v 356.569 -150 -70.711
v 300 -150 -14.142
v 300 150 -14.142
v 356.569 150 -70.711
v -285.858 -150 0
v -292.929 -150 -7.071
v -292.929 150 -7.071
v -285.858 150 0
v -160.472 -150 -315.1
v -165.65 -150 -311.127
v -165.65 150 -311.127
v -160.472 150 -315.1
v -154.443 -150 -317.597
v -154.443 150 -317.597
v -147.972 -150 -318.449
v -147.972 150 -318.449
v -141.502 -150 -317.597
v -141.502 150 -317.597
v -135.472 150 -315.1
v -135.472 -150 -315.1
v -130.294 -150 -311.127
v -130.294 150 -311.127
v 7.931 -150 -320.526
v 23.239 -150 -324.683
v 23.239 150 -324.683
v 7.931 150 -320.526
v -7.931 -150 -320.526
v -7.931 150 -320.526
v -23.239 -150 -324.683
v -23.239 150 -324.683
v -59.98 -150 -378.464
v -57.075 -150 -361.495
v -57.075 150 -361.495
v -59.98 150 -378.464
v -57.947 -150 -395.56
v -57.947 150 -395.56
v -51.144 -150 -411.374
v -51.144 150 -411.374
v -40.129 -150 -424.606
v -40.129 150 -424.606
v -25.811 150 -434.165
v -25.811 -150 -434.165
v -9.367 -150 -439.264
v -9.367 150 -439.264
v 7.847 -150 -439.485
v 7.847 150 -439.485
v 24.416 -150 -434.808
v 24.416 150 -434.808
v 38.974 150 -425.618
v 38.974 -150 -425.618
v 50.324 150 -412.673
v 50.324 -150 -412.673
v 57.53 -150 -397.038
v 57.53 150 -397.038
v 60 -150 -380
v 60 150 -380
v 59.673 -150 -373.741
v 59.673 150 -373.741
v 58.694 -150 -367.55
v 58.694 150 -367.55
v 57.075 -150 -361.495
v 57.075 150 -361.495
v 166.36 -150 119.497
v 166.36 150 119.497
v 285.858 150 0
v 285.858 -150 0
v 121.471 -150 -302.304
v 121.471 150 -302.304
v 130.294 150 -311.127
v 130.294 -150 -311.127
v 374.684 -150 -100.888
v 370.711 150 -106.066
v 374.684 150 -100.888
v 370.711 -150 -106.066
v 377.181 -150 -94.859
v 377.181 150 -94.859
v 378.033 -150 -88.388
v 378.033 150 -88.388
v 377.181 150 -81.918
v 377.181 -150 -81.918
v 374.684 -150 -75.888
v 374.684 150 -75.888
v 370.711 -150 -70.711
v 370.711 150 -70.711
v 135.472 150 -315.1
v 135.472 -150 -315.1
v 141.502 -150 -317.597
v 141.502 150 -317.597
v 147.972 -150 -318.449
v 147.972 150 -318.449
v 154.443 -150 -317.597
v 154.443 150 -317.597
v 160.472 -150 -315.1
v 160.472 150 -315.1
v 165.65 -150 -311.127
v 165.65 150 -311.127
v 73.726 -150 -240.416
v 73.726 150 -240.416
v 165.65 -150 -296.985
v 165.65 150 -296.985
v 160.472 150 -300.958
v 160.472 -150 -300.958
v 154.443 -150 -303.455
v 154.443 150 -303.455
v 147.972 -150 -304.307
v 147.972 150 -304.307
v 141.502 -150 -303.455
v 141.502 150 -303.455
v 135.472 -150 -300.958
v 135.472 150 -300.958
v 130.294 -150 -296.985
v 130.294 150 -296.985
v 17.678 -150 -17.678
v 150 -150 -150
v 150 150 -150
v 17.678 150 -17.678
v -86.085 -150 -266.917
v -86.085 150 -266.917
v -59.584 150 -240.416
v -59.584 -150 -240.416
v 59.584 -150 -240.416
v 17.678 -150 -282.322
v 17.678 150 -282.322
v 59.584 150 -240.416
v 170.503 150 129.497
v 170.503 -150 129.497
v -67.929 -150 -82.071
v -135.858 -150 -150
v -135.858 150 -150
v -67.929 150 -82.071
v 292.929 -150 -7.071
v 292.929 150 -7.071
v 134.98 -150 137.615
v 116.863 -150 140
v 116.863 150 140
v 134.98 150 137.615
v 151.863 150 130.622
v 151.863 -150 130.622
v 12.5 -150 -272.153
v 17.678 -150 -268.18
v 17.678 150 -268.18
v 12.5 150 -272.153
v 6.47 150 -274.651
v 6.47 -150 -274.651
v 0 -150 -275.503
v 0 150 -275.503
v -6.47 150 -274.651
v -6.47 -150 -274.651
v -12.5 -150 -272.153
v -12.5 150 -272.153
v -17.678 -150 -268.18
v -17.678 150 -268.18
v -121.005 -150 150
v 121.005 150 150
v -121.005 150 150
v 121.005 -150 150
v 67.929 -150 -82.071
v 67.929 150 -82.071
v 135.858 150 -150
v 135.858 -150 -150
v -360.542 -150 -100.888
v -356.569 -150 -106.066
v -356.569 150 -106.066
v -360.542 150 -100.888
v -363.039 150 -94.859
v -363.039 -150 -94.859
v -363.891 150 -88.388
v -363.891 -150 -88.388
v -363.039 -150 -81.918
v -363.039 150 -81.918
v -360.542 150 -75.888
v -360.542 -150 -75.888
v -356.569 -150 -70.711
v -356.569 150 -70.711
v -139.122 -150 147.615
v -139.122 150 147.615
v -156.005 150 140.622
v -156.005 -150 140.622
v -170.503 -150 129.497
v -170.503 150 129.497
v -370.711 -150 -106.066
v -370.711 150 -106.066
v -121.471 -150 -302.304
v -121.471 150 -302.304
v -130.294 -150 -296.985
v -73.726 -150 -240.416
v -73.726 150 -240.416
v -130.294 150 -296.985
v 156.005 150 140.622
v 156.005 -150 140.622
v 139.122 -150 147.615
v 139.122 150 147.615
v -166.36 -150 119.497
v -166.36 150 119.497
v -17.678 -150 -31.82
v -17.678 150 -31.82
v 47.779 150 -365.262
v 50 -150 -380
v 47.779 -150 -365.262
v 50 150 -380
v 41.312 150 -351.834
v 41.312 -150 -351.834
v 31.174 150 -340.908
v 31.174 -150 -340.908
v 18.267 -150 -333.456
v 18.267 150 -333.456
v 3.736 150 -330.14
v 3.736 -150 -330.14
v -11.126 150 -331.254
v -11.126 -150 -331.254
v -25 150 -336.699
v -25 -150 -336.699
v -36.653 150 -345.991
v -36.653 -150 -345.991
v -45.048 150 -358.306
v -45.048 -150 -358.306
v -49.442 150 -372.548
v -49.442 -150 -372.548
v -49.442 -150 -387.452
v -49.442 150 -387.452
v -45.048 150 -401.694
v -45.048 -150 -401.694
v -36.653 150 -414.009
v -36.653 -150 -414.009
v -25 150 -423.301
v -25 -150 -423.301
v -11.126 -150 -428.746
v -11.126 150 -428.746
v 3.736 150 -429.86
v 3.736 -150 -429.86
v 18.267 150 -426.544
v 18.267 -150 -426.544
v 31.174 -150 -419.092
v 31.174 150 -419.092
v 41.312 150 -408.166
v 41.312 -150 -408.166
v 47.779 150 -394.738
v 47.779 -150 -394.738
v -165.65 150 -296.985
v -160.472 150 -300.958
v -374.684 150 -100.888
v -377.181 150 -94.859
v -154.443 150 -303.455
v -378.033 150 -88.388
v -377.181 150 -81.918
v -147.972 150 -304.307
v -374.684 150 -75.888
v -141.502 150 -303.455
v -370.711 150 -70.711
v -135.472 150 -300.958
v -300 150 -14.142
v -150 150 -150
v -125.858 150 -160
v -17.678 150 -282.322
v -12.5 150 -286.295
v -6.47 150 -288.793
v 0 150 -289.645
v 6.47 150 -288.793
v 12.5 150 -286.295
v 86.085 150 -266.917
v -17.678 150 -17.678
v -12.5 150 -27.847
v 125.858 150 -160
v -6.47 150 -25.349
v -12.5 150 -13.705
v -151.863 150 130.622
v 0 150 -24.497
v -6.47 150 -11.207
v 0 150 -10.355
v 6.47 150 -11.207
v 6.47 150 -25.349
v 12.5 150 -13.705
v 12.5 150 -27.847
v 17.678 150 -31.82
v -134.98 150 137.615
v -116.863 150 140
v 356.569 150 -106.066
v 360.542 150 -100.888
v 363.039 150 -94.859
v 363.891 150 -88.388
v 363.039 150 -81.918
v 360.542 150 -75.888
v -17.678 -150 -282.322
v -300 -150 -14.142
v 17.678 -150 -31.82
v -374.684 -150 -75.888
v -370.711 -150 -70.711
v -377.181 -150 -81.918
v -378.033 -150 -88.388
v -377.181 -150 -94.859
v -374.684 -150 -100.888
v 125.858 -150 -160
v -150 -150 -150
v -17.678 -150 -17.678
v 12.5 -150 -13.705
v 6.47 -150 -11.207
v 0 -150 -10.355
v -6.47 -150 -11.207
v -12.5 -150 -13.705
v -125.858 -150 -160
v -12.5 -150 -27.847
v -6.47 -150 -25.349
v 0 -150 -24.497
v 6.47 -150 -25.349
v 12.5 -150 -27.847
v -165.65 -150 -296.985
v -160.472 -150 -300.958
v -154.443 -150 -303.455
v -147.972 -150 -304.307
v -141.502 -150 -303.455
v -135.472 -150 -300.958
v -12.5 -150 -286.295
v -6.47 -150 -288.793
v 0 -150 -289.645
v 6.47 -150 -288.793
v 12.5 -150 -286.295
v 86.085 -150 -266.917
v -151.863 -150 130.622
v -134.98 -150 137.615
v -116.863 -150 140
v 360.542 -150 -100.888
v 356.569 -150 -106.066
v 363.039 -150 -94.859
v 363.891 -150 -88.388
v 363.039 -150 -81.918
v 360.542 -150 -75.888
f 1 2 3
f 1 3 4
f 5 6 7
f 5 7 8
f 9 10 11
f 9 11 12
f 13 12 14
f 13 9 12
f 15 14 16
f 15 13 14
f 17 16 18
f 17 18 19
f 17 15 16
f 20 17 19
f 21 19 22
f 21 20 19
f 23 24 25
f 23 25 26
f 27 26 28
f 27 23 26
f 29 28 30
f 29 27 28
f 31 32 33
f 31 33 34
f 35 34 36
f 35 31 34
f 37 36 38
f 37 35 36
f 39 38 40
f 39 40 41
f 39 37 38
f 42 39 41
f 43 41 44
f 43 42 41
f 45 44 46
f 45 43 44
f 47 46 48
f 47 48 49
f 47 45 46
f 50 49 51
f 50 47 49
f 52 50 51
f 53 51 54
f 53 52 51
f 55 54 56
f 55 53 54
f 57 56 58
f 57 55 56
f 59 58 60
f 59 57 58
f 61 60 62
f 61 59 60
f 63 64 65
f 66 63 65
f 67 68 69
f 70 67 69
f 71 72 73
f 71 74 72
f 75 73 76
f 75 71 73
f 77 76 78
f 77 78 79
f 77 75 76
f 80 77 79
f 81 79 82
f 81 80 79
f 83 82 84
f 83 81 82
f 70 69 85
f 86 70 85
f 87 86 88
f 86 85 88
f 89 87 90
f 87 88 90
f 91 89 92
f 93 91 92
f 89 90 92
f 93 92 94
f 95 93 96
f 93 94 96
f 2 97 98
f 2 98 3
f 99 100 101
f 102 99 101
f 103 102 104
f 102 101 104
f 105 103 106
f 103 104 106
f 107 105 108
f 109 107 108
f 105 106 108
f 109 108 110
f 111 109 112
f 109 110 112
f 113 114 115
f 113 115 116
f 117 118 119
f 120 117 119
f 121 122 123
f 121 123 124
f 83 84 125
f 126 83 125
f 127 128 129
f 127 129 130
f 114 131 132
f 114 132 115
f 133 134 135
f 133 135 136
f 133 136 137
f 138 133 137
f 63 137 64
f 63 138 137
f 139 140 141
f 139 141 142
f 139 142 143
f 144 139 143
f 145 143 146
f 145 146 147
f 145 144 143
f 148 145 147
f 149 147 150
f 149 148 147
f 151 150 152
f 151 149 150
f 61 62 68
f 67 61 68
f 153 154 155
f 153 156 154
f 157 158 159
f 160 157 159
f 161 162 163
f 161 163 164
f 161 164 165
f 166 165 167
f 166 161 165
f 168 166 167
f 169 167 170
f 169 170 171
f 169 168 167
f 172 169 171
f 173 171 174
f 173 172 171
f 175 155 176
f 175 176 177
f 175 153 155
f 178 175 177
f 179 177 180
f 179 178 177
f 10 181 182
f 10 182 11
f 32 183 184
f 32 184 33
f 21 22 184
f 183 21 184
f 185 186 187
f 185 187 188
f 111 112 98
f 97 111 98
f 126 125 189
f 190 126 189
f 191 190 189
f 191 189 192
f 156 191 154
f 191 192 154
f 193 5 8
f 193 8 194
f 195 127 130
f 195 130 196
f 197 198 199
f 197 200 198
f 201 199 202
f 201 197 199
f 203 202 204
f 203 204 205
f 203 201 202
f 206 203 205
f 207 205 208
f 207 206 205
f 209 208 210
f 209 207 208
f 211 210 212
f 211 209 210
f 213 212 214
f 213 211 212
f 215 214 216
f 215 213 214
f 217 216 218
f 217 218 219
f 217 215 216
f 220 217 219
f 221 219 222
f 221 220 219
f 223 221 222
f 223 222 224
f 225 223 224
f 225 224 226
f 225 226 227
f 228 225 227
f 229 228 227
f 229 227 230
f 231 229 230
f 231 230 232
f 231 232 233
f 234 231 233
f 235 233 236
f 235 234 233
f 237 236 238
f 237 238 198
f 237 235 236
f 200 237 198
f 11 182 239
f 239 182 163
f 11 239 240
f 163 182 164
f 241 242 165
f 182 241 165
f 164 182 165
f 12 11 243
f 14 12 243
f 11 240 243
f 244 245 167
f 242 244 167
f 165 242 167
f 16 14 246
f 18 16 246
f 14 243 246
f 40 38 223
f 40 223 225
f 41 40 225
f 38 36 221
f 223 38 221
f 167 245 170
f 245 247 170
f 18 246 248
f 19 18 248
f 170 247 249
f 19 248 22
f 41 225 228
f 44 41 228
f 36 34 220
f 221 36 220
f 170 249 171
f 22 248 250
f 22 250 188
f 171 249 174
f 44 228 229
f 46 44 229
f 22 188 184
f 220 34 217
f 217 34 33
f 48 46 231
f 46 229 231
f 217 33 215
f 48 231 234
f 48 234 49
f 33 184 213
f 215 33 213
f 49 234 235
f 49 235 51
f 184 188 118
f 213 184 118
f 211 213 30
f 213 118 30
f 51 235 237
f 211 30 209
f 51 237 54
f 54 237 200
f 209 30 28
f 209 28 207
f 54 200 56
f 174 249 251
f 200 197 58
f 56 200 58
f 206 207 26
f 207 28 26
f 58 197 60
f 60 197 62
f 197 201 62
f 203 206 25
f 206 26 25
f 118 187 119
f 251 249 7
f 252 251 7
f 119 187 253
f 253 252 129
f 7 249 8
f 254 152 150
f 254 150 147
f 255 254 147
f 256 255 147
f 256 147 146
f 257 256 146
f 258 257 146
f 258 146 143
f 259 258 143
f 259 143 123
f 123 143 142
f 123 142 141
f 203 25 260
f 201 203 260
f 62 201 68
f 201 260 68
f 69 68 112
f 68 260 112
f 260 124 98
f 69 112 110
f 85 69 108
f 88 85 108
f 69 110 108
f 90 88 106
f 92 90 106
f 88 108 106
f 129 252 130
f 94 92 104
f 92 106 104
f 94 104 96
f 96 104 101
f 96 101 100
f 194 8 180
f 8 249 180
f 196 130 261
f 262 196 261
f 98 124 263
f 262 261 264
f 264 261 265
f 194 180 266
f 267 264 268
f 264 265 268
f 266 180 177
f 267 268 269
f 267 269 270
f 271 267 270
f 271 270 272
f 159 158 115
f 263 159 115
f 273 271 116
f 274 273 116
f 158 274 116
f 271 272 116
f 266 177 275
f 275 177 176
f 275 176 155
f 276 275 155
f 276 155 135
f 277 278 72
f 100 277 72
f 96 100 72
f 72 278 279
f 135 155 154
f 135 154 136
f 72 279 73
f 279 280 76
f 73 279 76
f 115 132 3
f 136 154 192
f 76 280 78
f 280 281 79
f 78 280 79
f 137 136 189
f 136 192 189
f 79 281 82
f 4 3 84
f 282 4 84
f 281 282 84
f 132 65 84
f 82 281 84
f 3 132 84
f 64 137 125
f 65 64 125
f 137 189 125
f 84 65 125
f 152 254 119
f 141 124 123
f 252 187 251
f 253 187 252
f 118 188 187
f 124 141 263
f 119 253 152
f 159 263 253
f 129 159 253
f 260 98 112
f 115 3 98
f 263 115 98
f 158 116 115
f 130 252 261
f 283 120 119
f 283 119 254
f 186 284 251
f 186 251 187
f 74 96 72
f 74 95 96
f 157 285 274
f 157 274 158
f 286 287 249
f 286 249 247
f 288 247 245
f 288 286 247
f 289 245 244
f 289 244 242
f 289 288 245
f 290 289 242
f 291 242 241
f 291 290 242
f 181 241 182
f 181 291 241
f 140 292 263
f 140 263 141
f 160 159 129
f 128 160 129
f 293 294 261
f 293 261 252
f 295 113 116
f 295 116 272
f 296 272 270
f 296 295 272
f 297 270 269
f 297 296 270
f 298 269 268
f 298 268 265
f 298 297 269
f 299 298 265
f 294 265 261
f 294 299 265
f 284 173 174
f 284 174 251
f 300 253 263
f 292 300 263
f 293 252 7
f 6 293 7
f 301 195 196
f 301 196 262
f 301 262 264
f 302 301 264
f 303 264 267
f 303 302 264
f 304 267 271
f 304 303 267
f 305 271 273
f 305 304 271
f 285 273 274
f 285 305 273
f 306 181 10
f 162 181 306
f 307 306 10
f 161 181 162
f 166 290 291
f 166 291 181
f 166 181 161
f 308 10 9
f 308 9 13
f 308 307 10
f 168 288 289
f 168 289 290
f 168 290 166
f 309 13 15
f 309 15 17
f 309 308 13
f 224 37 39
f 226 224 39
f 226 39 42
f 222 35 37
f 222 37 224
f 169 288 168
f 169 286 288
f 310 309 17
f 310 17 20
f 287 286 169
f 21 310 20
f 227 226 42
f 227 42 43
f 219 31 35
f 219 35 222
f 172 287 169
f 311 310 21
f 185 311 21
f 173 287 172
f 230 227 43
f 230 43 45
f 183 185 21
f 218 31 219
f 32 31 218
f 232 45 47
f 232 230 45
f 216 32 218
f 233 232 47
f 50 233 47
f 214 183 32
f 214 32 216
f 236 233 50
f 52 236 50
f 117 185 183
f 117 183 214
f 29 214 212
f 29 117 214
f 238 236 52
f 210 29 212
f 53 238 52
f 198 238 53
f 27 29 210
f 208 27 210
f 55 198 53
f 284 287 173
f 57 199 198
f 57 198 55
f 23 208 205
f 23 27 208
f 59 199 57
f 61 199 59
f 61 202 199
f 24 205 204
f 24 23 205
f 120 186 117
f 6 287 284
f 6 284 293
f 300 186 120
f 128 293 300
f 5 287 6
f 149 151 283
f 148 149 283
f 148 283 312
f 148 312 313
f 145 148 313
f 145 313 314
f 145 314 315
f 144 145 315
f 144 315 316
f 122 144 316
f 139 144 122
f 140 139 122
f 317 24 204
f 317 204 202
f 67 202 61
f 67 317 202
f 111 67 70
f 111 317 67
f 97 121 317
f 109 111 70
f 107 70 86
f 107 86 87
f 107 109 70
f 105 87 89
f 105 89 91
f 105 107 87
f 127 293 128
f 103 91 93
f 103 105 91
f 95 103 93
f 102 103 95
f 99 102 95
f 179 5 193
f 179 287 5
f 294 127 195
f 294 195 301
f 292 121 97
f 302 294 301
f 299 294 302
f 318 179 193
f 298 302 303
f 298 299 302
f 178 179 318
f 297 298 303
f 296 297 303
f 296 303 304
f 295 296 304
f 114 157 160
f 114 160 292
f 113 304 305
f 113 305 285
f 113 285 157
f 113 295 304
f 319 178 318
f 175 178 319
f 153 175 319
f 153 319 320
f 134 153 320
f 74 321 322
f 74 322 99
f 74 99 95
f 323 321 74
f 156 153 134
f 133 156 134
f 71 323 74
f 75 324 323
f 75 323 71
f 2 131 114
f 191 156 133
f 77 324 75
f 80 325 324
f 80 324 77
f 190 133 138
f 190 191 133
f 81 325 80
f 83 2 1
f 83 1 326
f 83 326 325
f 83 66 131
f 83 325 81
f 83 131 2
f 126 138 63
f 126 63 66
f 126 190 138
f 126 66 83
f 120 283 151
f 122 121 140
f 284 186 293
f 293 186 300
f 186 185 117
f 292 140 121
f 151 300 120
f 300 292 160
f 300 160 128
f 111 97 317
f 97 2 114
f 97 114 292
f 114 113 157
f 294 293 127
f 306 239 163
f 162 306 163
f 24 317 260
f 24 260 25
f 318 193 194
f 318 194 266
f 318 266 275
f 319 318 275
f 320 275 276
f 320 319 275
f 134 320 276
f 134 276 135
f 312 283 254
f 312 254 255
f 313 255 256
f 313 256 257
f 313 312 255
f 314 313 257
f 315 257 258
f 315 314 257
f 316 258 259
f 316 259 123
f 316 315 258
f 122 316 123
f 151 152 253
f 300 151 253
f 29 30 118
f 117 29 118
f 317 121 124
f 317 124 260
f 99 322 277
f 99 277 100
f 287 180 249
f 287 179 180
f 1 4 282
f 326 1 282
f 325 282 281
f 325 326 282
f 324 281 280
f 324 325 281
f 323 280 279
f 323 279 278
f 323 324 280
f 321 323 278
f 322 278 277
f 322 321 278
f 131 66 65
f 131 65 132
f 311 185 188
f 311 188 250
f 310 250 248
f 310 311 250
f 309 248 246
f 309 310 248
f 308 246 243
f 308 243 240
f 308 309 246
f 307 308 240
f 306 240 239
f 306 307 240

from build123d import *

# Parameters (mm, degrees)
F0_R     = 50
F1_DEPTH = 150


# Not quite as in the source:
# - a feature names something its author has since deleted; it is built from what else it names


with BuildPart() as f1:
    # F0 (on Front) → F1 (new body, symmetric)
    with BuildSketch(Plane.XZ):
        with BuildLine():
            Line((-170.5025253169, 129.4974746831), (-300, 0))
            Line((-300, 0), (-292.9289321881, -7.0710678119))
            Line((-292.9289321881, -7.0710678119), (-285.8578643763, 0))
            Line((-285.8578643763, 0), (-166.3603896932, 119.4974746831))
            ThreePointArc((-166.3603896932, 119.4974746831), (-143.6507552757, 134.6715672758), (-116.8629150102, 140))
            Line((-116.8629150102, 140), (116.8629150102, 140))
            ThreePointArc((116.8629150102, 140), (143.6507552757, 134.6715672758), (166.3603896932, 119.4974746831))
            Line((166.3603896932, 119.4974746831), (285.8578643763, 0))
            Line((285.8578643763, 0), (292.9289321881, -7.0710678119))
            Line((292.9289321881, -7.0710678119), (150, -150))
            Line((150, -150), (59.5836943966, -240.4163056034))
            Line((59.5836943966, -240.4163056034), (86.0845268471, -266.917138054))
            Line((86.0845268471, -266.917138054), (121.4712095943, -302.3038208012))
            Line((121.4712095943, -302.3038208012), (130.2943725152, -311.1269837221))
            ThreePointArc((130.2943725152, -311.1269837221), (147.9720420449, -318.4493141924), (165.6497115746, -311.1269837221))
            Line((165.6497115746, -311.1269837221), (370.7106781187, -106.066017178))
            ThreePointArc((370.7106781187, -106.066017178), (378.033008589, -88.3883476483), (370.7106781187, -70.7106781187))
            Line((370.7106781187, -70.7106781187), (300, 0))
            Line((300, 0), (170.5025253169, 129.4974746831))
            ThreePointArc((170.5025253169, 129.4974746831), (147.7928908994, 144.6715672758), (121.0050506339, 150))
            Line((121.0050506339, 150), (-121.0050506339, 150))
            ThreePointArc((-121.0050506339, 150), (-147.7928908994, 144.6715672758), (-170.5025253169, 129.4974746831))
        make_face()
        with BuildLine():
            Line((73.7258300203, -240.4163056034), (300, -14.1421356237))
            Line((300, -14.1421356237), (356.5685424949, -70.7106781187))
            ThreePointArc((356.5685424949, -70.7106781187), (363.8908729653, -88.3883476483), (356.5685424949, -106.066017178))
            Line((356.5685424949, -106.066017178), (165.6497115746, -296.9848480984))
            ThreePointArc((165.6497115746, -296.9848480984), (147.9720420449, -304.3071785687), (130.2943725152, -296.9848480984))
            Line((130.2943725152, -296.9848480984), (73.7258300203, -240.4163056034))
        make_face(mode=Mode.SUBTRACT)
        with BuildLine():
            Line((-17.6776695297, -17.6776695297), (-150, -150))
            Line((-150, -150), (-59.5836943966, -240.4163056034))
            Line((-59.5836943966, -240.4163056034), (-17.6776695297, -282.3223304703))
            ThreePointArc((-17.6776695297, -282.3223304703), (0, -289.6446609407), (17.6776695297, -282.3223304703))
            Line((17.6776695297, -282.3223304703), (59.5836943966, -240.4163056034))
            Line((59.5836943966, -240.4163056034), (150, -150))
            Line((150, -150), (17.6776695297, -17.6776695297))
            ThreePointArc((17.6776695297, -17.6776695297), (0, -10.3553390593), (-17.6776695297, -17.6776695297))
        make_face()
        with BuildLine():
            ThreePointArc((17.6776695297, -268.1801948466), (0, -275.5025253169), (-17.6776695297, -268.1801948466))
            Line((-17.6776695297, -268.1801948466), (-125.8578643763, -160))
            Line((-125.8578643763, -160), (-135.8578643763, -150))
            Line((-135.8578643763, -150), (-67.9289321881, -82.0710678119))
            Line((-67.9289321881, -82.0710678119), (-17.6776695297, -31.8198051534))
            ThreePointArc((-17.6776695297, -31.8198051534), (0, -24.4974746831), (17.6776695297, -31.8198051534))
            Line((17.6776695297, -31.8198051534), (67.9289321881, -82.0710678119))
            Line((67.9289321881, -82.0710678119), (135.8578643763, -150))
            Line((135.8578643763, -150), (125.8578643763, -160))
            Line((125.8578643763, -160), (17.6776695297, -268.1801948466))
        make_face(mode=Mode.SUBTRACT)
        with BuildLine():
            Line((-292.9289321881, -7.0710678119), (-300, 0))
            Line((-300, 0), (-370.7106781187, -70.7106781187))
            ThreePointArc((-370.7106781187, -70.7106781187), (-378.033008589, -88.3883476483), (-370.7106781187, -106.066017178))
            Line((-370.7106781187, -106.066017178), (-165.6497115746, -311.1269837221))
            ThreePointArc((-165.6497115746, -311.1269837221), (-147.9720420449, -318.4493141924), (-130.2943725152, -311.1269837221))
            Line((-130.2943725152, -311.1269837221), (-121.4712095523, -302.3038207591))
            Line((-121.4712095523, -302.3038207591), (-86.0845268892, -266.917138096))
            Line((-86.0845268892, -266.917138096), (-59.5836943966, -240.4163056034))
            Line((-59.5836943966, -240.4163056034), (-150, -150))
            Line((-150, -150), (-292.9289321881, -7.0710678119))
        make_face()
        with BuildLine():
            Line((-356.5685424949, -70.7106781187), (-300, -14.1421356237))
            Line((-300, -14.1421356237), (-73.7258300203, -240.4163056034))
            Line((-73.7258300203, -240.4163056034), (-130.2943725152, -296.9848480984))
            ThreePointArc((-130.2943725152, -296.9848480984), (-147.9720420449, -304.3071785687), (-165.6497115746, -296.9848480984))
            Line((-165.6497115746, -296.9848480984), (-356.5685424949, -106.066017178))
            ThreePointArc((-356.5685424949, -106.066017178), (-363.8908729653, -88.3883476483), (-356.5685424949, -70.7106781187))
        make_face(mode=Mode.SUBTRACT)
        with BuildLine():
            ThreePointArc((23.2387555319, -324.683089695), (-4.1825e-06, -319.9999946001), (-23.238764161, -324.6830883841))
            ThreePointArc((-23.238764161, -324.6830883841), (-44.1741271353, -339.3964601375), (-57.0750428799, -361.4948561013))
            ThreePointArc((-57.0750428799, -361.4948561013), (-9.3674436165, -439.2642427617), (59.9999941253, -379.9999946001))
            ThreePointArc((59.9999941253, -379.9999946001), (59.264242551, -370.6325585299), (57.0750321743, -361.4948593208))
            ThreePointArc((57.0750321743, -361.4948593208), (44.1741176762, -339.3964626293), (23.2387555319, -324.683089695))
        make_face()
        with Locations((-5.8747e-06, -379.9999946001)):
            Circle(F0_R, mode=Mode.SUBTRACT)
        with BuildLine():
            Line((86.0845268471, -266.917138054), (23.2387555319, -324.683089695))
            ThreePointArc((23.2387555319, -324.683089695), (44.1741176762, -339.3964626293), (57.0750321743, -361.4948593208))
            Line((57.0750321743, -361.4948593208), (121.4712095943, -302.3038208012))
            Line((121.4712095943, -302.3038208012), (86.0845268471, -266.917138054))
        make_face()
        with BuildLine():
            Line((-23.238764161, -324.6830883841), (-86.0845268892, -266.917138096))
            Line((-86.0845268892, -266.917138096), (-121.4712095523, -302.3038207591))
            Line((-121.4712095523, -302.3038207591), (-57.0750428799, -361.4948561013))
            ThreePointArc((-57.0750428799, -361.4948561013), (-44.1741271353, -339.3964601375), (-23.238764161, -324.6830883841))
        make_face()
        Polygon((-135.8578643763, -150), (-125.8578643763, -160), (125.8578643763, -160), (135.8578643763, -150), align=None)
    extrude(amount=F1_DEPTH, both=True)


solid = f1.part
